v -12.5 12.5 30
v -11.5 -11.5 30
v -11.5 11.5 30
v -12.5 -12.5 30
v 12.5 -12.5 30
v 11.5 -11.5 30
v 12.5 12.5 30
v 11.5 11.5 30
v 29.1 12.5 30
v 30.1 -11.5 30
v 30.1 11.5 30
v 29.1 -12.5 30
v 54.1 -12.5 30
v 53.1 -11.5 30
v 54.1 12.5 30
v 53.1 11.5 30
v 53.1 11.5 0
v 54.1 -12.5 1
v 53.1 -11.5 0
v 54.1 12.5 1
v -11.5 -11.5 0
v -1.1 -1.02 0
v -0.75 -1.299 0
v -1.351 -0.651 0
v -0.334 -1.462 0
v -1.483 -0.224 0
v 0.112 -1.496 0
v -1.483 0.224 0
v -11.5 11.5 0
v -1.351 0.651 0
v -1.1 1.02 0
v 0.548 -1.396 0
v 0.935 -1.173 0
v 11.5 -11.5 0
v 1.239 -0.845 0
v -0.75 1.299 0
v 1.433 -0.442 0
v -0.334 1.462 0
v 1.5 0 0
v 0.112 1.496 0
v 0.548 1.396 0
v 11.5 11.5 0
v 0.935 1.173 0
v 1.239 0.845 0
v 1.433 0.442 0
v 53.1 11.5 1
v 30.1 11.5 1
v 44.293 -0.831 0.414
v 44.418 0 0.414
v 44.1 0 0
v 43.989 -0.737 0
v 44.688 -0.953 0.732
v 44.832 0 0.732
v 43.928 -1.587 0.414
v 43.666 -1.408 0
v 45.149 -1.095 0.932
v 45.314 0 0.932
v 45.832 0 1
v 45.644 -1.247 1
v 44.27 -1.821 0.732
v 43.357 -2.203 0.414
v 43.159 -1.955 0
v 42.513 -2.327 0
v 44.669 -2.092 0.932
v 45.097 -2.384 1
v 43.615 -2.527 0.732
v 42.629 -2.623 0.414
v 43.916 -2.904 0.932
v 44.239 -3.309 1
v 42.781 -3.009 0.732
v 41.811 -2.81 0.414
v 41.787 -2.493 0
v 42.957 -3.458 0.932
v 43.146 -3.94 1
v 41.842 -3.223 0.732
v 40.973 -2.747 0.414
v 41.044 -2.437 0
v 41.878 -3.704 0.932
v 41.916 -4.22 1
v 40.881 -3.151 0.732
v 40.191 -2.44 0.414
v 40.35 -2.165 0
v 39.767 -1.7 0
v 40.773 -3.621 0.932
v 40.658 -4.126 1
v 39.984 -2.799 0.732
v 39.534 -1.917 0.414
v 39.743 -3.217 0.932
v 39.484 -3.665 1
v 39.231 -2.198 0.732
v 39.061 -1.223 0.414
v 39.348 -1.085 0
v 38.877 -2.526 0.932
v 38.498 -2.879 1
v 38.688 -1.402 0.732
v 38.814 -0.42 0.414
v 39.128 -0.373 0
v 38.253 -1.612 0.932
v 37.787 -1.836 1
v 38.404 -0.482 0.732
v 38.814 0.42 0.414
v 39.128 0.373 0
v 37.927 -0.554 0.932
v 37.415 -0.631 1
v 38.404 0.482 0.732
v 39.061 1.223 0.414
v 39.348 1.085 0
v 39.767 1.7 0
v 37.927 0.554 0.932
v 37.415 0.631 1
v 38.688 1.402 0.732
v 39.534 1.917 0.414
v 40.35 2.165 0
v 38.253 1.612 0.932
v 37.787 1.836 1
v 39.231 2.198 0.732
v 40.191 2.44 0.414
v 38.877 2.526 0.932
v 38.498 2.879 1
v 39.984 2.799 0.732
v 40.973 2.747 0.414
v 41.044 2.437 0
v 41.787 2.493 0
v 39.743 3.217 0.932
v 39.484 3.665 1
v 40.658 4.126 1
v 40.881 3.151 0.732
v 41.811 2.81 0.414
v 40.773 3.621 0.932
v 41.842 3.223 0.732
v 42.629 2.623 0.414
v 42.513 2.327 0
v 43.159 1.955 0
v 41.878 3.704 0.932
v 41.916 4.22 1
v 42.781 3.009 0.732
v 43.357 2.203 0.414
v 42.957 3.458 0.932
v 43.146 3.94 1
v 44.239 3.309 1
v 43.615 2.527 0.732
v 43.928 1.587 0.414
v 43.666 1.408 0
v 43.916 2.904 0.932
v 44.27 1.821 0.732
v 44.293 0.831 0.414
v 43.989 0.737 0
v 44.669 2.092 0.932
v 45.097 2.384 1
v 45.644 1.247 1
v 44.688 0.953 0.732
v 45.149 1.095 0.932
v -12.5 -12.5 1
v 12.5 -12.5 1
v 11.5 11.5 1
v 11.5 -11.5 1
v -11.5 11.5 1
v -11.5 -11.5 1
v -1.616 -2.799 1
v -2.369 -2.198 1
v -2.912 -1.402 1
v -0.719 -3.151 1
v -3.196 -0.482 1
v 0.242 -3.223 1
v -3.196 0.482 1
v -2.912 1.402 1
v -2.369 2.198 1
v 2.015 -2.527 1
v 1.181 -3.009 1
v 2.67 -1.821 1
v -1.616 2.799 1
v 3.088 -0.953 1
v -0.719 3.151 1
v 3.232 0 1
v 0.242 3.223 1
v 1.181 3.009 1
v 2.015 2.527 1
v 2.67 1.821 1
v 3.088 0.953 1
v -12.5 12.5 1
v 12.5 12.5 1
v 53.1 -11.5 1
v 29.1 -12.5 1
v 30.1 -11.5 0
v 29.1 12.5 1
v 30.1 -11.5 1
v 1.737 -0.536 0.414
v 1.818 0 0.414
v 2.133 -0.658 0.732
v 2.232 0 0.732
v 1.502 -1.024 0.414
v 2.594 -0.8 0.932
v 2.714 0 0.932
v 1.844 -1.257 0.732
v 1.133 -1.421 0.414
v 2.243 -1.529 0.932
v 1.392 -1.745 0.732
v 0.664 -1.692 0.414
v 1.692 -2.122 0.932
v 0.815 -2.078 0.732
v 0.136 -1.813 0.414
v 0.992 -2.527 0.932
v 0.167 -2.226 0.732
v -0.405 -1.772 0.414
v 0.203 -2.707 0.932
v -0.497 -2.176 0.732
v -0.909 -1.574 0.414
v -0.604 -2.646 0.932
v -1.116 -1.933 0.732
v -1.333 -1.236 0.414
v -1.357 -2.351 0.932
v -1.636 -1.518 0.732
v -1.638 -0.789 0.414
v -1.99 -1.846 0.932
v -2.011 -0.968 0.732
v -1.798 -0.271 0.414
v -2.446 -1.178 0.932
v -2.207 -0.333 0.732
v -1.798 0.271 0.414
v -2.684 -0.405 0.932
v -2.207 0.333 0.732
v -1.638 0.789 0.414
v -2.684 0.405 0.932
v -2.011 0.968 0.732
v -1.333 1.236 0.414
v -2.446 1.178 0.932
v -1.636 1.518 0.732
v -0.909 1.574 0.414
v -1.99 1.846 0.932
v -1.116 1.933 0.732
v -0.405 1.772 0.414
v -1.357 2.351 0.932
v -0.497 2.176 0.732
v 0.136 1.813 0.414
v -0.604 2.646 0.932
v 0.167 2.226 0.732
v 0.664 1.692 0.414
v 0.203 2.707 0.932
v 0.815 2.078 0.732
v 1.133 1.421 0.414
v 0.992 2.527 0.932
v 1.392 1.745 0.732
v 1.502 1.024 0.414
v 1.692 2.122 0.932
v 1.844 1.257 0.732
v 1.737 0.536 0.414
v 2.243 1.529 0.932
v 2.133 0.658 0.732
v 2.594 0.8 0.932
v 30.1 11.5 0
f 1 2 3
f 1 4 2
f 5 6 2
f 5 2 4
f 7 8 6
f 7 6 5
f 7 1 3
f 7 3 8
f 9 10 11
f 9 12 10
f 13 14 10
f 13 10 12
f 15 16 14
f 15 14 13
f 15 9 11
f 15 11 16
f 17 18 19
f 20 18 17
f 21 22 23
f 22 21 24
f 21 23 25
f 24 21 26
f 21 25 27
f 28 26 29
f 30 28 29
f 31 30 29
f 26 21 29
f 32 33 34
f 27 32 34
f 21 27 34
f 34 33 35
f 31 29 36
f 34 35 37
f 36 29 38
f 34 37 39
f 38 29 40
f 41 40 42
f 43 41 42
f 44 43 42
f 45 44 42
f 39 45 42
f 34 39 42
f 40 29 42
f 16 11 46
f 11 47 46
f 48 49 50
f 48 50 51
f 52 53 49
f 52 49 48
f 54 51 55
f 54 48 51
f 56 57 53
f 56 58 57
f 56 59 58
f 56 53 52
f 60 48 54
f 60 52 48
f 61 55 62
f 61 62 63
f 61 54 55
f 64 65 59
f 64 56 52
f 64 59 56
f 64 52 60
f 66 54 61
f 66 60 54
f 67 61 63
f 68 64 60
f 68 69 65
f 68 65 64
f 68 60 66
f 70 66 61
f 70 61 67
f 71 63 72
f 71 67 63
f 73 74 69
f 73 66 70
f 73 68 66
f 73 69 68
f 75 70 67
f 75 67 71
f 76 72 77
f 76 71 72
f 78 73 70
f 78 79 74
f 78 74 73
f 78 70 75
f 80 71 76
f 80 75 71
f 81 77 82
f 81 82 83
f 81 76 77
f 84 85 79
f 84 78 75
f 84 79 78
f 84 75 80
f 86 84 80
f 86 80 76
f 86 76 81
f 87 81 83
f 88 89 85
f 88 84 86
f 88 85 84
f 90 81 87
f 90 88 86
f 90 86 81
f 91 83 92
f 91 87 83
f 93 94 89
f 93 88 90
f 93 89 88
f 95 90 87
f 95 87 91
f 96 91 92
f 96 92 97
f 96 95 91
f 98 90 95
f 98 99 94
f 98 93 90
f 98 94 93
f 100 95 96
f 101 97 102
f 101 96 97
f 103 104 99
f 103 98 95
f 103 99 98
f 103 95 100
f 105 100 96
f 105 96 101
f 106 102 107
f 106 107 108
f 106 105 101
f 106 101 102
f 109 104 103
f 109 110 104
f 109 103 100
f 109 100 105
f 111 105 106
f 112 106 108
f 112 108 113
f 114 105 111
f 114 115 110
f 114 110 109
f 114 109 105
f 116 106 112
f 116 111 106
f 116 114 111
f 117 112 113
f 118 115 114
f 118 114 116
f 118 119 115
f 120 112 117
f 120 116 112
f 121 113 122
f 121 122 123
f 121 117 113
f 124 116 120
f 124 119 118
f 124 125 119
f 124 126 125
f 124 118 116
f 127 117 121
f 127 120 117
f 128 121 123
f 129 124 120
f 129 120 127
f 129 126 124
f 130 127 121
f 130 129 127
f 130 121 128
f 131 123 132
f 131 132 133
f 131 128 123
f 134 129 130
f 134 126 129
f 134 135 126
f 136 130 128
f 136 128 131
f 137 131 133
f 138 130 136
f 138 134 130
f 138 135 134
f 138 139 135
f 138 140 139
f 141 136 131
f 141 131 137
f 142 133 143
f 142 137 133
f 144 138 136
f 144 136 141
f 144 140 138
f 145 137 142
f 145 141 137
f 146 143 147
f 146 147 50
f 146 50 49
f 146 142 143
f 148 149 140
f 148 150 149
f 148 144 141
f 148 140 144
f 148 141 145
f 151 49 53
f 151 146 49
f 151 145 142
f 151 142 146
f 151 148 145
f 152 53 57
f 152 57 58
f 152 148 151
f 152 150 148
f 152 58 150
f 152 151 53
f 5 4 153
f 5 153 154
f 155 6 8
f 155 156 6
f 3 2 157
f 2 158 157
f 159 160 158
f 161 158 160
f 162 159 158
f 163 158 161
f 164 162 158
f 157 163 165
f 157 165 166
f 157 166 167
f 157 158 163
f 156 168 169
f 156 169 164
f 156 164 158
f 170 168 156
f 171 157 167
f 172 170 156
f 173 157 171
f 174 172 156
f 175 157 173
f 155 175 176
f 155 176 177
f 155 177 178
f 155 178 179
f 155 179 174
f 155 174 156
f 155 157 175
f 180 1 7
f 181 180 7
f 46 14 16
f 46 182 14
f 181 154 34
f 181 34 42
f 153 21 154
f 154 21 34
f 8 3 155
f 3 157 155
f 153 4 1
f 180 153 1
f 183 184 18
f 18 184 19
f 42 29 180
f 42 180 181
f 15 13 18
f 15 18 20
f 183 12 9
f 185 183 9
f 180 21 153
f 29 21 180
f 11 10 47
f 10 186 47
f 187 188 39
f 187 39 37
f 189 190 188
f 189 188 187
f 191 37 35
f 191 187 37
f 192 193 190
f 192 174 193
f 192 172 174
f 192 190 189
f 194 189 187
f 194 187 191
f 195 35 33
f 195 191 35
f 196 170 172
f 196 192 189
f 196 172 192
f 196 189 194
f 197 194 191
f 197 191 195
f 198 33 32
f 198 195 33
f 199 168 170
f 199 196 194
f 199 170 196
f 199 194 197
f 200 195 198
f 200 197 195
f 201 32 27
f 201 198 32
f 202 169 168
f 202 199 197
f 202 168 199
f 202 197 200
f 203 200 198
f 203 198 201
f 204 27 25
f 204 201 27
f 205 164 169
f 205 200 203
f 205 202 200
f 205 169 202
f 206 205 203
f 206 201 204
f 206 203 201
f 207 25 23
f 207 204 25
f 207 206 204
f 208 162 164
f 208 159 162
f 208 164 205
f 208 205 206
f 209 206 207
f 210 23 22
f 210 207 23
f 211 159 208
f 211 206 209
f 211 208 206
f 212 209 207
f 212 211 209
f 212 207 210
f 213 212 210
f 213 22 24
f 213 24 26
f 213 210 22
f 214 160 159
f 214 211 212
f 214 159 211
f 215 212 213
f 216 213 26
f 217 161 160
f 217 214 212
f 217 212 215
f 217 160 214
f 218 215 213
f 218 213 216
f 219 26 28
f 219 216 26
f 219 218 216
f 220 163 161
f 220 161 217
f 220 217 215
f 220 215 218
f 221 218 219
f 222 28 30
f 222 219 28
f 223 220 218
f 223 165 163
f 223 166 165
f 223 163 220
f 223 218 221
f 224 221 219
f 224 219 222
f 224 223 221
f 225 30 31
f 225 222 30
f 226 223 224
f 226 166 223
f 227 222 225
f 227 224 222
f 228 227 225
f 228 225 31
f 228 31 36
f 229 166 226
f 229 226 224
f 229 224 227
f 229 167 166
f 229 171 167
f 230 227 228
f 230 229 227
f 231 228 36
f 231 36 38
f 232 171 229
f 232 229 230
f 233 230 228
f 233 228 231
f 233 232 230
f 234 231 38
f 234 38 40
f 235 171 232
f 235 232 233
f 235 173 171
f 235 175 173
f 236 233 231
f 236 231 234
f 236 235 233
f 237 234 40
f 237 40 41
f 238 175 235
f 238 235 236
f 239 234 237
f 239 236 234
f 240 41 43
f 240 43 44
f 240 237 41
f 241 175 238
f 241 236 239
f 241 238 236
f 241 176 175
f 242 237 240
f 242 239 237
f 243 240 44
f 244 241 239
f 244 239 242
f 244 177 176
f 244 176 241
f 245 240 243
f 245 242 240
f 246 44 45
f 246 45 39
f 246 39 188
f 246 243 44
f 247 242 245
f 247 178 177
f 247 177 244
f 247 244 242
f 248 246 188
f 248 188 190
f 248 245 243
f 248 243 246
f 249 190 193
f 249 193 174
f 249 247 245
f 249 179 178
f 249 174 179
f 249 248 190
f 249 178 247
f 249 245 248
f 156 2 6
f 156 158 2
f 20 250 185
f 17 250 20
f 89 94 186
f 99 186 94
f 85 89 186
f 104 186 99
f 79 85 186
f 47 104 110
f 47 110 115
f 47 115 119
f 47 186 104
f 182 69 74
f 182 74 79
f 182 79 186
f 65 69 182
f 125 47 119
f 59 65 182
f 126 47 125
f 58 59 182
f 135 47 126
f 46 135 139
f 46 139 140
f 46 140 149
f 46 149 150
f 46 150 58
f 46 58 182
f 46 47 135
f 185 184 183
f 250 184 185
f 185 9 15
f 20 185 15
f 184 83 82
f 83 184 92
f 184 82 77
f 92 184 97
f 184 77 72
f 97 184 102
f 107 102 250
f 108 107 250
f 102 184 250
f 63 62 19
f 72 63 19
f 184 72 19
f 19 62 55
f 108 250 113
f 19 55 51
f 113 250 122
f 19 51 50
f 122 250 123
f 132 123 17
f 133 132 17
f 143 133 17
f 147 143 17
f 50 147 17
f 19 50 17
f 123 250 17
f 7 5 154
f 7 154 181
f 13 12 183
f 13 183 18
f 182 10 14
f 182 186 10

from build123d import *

# Parameters (mm, degrees)
F0_W      = 25
F0_H      = 25
F1_DEPTH  = 30
F2_T      = -1
F4_R      = 1.5
F4_R_2    = 2.5
F5_DEPTH  = 30.001
F7_SIZE   = 1
F7_2_SIZE = 1


# Not quite as in the source:
# - a fillet or chamfer that OpenCascade refuses, or shapes differently, is made with other operations: its cross-section is extruded or revolved along the edge and cut away or added


with BuildPart() as f1:
    # F0 (on Top) → F1 (new body)
    with BuildSketch(Plane.XY):
        Rectangle(F0_W, F0_H)
    extrude(amount=F1_DEPTH)

    # F2
    f2_openings = [f1.faces().sort_by_distance(p)[0] for p in [
        (0, 0, 30),
    ]]
    offset(amount=F2_T, openings=f2_openings)


with BuildPart() as f3_1:
    # F3: copy of F1
    add(f1.part.moved(Location((41.6, 0, 0))))


with BuildPart() as f5_tool:
    # F4 (on face) → F5 (new body, through all)
    with BuildSketch(Plane(origin=(0, 0, 0), x_dir=(1, 0, 0), z_dir=(0, 0, -1))):
        Circle(F4_R)
        with Locations((41.6, 0)):
            Circle(F4_R_2)
    extrude(amount=-F5_DEPTH)


with BuildPart() as f1_1:
    add(f1.part)

    # F5: cut by f5_tool
    add(f5_tool.part, mode=Mode.SUBTRACT)

    # F6: fillet of radius 2 on 1 edges, made by hand

    # F6_s1 → F6_t2 (revolve, cut)
    with BuildSketch(Plane.XZ):
        with BuildLine():
            ThreePointArc((1.5, 0), (2.2320508076, 0.7320508076), (3.2320508076, 1))
            Line((3.2320508076, 1), (1.5, 1))
            Line((1.5, 1), (1.5, 0))
        make_face()
    revolve(axis=Axis((0, 0, 1), (0, 0, -1)), mode=Mode.SUBTRACT)

    # F7
    f7_edges = [f1_1.edges().sort_by_distance(p)[0] for p in [
        (-12.5, 0, 0),
        (0, 12.5, 0),
        (12.5, 0, 0),
        (0, -12.5, 0),
    ]]
    chamfer(f7_edges, length=F7_SIZE)


with BuildPart() as f3_1_1:
    add(f3_1.part)

    # F5: cut by f5_tool
    add(f5_tool.part, mode=Mode.SUBTRACT)

    # F6#2: fillet of radius 2 on 1 edges, made by hand

    # F6_2_s1 → F6_2_t2 (revolve, cut)
    with BuildSketch(Plane.XZ):
        with BuildLine():
            ThreePointArc((44.1, 0), (44.8320508076, 0.7320508076), (45.8320508076, 1))
            Line((45.8320508076, 1), (44.1, 1))
            Line((44.1, 1), (44.1, 0))
        make_face()
    revolve(axis=Axis((41.6, 0, 1), (0, 0, -1)), mode=Mode.SUBTRACT)

    # F7#2
    f7_2_edges = [f3_1_1.edges().sort_by_distance(p)[0] for p in [
        (41.6, -12.5, 0),
        (29.1, 0, 0),
        (54.1, 0, 0),
        (41.6, 12.5, 0),
    ]]
    chamfer(f7_2_edges, length=F7_2_SIZE)


solid = Compound([f1_1.part, f3_1_1.part])
